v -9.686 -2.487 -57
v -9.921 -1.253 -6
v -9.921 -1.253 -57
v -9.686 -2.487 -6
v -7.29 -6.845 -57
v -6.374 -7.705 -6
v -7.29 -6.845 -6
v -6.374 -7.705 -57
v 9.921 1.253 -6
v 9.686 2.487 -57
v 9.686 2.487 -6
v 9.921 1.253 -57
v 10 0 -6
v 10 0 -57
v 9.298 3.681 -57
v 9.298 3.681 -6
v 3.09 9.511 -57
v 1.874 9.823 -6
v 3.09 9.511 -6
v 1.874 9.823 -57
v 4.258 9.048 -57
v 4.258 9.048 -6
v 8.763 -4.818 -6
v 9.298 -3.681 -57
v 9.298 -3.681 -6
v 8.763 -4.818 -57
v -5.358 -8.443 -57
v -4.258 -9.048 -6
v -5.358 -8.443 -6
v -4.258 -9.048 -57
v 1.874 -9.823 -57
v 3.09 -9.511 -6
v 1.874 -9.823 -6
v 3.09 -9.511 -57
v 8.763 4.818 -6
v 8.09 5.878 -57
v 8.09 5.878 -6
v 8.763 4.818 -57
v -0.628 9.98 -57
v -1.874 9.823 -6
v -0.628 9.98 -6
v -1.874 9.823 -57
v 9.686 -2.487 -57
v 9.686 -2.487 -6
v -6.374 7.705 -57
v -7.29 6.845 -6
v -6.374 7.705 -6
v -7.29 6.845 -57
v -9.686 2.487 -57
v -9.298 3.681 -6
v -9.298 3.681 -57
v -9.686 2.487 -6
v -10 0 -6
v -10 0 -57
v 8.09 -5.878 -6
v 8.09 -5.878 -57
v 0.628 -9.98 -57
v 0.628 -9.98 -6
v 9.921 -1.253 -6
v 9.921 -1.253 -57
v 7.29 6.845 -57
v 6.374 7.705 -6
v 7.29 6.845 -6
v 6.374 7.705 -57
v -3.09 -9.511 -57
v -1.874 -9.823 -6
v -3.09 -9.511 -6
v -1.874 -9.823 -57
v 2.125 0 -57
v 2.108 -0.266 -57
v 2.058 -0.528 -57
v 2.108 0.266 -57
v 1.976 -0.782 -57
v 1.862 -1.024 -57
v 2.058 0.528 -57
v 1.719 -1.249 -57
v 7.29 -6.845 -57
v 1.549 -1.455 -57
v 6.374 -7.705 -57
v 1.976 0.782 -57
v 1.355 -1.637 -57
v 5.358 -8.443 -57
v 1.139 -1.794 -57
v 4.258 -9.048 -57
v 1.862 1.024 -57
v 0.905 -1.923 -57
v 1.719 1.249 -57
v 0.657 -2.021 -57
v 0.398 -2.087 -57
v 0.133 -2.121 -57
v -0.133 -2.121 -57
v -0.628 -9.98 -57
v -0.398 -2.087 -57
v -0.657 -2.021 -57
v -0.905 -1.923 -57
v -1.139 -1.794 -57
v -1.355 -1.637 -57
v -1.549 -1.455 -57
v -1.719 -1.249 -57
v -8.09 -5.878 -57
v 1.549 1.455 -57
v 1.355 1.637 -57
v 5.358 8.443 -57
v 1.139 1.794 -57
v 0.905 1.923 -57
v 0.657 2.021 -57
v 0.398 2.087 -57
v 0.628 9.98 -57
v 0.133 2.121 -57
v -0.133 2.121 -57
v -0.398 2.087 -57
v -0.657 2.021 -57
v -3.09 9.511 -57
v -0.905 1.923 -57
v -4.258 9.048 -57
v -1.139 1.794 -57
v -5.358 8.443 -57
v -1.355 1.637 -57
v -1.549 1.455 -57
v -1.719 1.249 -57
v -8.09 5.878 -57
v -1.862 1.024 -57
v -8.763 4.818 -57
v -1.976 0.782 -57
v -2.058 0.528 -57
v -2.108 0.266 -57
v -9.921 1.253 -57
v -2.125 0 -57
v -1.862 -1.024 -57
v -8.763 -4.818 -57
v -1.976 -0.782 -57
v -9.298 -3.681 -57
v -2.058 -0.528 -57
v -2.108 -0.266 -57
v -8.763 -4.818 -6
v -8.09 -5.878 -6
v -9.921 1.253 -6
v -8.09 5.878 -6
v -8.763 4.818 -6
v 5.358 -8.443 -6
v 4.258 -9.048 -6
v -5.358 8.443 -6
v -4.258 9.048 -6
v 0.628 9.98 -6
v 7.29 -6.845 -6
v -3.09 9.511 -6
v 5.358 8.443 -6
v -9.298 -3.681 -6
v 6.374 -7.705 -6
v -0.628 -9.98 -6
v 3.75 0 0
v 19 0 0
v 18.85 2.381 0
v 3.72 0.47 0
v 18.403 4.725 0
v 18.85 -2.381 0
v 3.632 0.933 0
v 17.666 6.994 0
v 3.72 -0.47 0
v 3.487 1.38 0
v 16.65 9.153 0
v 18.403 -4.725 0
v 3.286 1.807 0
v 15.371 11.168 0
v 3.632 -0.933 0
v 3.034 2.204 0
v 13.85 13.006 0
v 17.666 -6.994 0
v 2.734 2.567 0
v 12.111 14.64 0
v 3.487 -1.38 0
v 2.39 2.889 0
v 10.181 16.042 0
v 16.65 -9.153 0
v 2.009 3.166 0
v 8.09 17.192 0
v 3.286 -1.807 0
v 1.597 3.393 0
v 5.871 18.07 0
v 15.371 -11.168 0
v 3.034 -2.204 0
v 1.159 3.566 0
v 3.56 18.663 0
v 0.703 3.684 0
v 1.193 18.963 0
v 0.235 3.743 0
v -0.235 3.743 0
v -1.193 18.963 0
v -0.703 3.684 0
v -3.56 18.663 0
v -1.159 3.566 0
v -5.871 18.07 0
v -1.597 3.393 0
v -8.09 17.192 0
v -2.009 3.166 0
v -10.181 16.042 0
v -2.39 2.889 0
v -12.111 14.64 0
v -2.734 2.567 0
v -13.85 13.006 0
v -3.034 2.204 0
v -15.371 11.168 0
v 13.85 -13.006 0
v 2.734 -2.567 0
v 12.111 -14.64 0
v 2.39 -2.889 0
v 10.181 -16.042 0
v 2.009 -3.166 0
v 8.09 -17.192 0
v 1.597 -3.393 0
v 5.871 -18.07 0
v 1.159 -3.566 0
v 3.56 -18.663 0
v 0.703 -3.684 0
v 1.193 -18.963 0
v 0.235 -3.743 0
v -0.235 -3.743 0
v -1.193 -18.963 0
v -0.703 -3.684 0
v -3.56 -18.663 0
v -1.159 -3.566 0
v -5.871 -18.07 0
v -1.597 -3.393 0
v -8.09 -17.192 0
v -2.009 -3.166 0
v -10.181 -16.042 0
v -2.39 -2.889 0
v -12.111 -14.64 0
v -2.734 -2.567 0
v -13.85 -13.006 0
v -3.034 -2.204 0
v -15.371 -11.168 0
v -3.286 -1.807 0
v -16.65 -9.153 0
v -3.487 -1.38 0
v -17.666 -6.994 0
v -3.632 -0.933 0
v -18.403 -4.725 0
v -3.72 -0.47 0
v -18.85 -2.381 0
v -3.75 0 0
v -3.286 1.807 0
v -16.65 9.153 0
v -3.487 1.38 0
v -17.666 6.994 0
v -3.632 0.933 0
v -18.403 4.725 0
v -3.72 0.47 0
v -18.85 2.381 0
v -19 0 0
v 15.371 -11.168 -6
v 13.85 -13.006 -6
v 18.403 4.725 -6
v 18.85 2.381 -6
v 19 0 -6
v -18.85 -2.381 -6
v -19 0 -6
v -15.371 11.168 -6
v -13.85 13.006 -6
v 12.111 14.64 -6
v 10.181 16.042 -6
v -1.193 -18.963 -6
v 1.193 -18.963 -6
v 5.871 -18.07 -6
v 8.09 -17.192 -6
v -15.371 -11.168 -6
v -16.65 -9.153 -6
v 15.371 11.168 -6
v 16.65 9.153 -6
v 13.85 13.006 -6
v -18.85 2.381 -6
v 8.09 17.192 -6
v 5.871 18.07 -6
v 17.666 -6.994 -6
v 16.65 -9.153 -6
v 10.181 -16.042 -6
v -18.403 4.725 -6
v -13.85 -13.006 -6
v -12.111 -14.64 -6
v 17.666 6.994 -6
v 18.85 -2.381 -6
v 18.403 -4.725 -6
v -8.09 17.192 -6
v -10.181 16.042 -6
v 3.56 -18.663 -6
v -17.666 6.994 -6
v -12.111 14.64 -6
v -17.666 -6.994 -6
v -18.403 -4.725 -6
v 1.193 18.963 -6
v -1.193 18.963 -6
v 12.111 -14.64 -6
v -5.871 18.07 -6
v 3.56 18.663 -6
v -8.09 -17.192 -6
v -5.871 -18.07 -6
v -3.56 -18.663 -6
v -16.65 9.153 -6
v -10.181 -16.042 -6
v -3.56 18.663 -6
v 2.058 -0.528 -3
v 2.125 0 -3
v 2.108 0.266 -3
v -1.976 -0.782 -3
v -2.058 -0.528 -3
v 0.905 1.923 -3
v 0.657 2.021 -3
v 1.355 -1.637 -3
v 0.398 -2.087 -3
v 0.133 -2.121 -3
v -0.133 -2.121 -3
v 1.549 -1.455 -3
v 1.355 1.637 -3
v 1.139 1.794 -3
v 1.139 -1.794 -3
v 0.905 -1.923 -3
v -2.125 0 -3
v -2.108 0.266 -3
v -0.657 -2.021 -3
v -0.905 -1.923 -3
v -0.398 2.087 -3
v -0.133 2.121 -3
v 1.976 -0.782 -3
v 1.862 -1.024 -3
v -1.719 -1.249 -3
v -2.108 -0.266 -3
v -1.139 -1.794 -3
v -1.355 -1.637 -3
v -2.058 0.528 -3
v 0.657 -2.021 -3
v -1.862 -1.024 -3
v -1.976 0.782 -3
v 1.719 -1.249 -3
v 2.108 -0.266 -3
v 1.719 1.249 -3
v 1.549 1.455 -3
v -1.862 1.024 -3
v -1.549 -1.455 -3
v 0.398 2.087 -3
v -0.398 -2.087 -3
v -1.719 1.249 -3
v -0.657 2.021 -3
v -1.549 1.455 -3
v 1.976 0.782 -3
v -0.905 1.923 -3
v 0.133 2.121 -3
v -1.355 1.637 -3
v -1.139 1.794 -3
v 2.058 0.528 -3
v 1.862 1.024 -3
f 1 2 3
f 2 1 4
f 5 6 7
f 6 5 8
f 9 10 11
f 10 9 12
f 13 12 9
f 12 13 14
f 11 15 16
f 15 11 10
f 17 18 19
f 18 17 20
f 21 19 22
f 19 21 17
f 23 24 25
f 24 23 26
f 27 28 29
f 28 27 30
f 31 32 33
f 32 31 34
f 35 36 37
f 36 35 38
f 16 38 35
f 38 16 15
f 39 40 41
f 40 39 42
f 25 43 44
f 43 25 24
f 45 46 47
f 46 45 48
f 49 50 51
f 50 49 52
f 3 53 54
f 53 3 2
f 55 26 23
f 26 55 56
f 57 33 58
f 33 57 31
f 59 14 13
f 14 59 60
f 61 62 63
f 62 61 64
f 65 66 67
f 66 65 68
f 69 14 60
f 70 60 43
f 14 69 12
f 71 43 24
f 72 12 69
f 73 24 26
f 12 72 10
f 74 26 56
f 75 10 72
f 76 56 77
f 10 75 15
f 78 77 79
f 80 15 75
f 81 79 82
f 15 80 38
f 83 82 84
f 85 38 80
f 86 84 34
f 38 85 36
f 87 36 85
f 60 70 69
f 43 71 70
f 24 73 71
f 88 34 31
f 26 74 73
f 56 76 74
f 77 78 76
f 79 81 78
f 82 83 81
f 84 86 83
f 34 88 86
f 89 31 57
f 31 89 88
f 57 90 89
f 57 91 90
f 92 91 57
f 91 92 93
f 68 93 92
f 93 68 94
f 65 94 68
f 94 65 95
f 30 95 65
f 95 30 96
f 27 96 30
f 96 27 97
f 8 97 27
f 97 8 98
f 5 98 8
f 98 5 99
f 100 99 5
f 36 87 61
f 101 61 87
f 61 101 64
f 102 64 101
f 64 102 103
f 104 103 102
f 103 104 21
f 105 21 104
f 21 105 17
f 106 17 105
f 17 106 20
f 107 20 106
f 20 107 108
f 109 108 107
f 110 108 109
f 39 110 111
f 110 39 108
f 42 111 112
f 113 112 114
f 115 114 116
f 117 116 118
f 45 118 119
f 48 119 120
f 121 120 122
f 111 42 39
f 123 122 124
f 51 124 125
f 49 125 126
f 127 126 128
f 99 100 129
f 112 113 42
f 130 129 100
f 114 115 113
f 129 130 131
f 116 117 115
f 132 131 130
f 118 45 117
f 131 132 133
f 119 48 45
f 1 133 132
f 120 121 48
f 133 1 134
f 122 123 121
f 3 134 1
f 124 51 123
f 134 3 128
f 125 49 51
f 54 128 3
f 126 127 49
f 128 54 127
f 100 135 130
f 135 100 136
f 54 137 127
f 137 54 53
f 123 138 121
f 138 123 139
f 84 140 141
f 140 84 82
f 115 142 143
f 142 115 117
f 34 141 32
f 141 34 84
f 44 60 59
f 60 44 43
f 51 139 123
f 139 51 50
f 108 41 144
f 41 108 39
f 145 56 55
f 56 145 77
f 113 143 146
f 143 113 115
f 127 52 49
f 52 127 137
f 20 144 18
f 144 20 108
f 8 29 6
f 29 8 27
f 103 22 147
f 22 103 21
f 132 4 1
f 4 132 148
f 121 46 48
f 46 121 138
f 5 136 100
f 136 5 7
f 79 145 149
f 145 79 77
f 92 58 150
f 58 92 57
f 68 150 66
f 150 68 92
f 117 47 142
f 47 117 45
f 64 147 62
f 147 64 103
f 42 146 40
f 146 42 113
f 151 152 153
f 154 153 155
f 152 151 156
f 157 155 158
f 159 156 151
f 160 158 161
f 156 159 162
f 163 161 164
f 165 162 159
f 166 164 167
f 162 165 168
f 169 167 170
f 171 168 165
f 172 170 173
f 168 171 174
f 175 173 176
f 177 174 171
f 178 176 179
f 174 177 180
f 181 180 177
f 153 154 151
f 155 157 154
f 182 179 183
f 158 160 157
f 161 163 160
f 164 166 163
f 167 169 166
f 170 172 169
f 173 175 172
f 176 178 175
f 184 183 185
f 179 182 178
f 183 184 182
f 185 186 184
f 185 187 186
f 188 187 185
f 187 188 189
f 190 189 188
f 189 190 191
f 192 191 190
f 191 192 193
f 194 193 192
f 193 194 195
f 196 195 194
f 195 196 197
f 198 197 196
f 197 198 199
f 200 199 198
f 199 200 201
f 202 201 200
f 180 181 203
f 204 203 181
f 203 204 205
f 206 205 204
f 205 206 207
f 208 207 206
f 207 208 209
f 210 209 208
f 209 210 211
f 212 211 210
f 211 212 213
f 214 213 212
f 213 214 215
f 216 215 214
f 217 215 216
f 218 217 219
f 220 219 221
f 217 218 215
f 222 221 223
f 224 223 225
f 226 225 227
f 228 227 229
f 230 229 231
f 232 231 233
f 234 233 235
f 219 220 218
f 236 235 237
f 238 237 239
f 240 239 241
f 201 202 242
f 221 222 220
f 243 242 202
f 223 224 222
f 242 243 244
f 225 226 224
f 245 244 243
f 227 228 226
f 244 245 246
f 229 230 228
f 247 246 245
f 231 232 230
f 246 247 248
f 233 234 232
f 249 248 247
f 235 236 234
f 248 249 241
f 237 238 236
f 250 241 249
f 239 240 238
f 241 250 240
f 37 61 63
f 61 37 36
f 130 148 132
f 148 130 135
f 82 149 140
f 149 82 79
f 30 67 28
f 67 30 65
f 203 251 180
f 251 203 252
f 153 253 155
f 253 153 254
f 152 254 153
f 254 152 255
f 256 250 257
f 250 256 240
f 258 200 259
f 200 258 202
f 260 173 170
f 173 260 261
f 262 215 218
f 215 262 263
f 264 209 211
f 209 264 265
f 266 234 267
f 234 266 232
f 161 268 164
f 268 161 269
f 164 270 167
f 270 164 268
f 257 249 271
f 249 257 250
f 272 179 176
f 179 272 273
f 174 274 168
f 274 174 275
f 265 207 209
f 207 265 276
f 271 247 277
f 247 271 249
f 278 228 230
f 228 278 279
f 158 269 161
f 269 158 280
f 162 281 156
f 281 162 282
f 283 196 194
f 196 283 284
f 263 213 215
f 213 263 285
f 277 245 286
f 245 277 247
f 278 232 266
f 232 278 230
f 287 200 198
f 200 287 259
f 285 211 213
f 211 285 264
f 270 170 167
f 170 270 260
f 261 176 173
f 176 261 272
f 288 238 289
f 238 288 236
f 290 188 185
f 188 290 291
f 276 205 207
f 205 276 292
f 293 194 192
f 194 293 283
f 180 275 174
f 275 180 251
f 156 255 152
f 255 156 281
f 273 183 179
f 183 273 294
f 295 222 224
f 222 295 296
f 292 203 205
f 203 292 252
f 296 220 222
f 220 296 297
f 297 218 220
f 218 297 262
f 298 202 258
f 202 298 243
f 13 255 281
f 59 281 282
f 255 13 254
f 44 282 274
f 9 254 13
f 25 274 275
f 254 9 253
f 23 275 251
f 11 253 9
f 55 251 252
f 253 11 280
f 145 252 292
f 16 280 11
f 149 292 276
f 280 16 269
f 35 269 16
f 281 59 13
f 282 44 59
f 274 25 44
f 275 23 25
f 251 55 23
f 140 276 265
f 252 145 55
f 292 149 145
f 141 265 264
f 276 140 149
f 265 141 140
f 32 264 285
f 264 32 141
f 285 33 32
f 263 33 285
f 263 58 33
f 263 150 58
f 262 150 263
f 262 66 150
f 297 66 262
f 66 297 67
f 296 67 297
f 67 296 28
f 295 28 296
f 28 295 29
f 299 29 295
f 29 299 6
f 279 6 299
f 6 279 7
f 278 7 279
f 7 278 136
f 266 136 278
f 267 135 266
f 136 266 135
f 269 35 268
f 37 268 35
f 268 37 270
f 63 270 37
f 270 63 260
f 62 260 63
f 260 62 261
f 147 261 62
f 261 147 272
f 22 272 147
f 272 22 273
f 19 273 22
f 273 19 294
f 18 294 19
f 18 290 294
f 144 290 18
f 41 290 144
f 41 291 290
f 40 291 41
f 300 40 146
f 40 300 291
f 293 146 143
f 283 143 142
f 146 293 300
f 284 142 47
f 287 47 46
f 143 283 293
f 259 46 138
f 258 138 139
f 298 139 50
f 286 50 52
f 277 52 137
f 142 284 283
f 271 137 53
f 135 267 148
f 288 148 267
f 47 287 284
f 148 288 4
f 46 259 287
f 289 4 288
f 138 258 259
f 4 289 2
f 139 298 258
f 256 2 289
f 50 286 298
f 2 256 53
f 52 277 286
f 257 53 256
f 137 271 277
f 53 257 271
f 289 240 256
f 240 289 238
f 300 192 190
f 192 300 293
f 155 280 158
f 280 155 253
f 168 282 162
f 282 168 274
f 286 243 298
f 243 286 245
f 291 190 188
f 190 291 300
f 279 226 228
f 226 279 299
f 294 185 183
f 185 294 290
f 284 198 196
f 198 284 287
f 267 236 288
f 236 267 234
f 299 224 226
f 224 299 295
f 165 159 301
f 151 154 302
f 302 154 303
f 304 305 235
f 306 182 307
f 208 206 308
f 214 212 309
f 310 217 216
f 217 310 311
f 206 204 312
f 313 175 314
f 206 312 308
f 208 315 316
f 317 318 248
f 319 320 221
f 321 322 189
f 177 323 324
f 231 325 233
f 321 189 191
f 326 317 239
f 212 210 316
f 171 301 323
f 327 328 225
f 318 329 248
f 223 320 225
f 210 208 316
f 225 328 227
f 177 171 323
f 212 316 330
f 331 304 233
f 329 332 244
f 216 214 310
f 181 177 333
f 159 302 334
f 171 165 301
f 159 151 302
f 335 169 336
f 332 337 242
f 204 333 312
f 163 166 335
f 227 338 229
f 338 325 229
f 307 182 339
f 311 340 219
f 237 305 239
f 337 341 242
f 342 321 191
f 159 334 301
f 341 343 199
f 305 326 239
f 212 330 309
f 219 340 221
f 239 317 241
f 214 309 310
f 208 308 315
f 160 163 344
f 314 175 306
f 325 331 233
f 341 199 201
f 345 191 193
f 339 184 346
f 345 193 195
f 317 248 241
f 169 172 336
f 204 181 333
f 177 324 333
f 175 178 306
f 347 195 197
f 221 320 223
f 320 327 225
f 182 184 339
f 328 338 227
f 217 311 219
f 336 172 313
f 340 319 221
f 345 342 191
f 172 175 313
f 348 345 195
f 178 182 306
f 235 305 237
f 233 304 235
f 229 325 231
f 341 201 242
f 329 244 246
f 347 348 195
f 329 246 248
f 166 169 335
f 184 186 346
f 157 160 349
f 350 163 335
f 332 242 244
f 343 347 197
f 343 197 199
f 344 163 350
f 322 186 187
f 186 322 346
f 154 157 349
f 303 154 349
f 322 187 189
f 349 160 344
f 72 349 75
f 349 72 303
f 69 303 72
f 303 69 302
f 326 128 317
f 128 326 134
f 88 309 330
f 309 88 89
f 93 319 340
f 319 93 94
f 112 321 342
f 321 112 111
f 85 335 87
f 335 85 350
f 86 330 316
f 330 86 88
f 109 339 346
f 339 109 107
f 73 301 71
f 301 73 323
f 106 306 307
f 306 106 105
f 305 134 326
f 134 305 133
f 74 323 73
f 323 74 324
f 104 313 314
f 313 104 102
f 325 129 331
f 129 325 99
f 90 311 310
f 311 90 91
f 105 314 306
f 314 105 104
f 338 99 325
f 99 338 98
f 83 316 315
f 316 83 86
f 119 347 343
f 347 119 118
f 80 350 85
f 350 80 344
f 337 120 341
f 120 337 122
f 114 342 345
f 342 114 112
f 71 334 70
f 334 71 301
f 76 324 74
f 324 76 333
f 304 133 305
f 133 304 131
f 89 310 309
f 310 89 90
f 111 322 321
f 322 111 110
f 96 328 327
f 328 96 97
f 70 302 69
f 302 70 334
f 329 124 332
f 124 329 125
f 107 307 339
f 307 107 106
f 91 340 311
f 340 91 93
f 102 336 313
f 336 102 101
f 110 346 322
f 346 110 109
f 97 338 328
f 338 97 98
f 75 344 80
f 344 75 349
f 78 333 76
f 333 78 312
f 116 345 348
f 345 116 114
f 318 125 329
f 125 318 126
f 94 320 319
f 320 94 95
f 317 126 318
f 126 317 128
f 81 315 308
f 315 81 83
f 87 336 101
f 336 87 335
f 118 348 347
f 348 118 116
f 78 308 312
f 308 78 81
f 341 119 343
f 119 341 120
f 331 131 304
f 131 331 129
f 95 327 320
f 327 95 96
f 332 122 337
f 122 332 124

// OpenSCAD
$fn = 50;


difference() {
	union() {
		translate(v = [0, 0, -57.0000000000]) {
			cylinder(h = 57, r = 10.0000000000);
		}
		translate(v = [0, 0, -6.0000000000]) {
			cylinder(h = 6, r = 19.0000000000);
		}
	}
	union() {
		translate(v = [0, 0, 0]) {
			rotate(a = [0, 0, 0]) {
				difference() {
					union() {
						#translate(v = [0, 0, -57.0000000000]) {
							cylinder(h = 57, r = 2.0000000000);
						}
						#translate(v = [0, 0, -3]) {
							cylinder(h = 3, r1 = 2.1250000000, r2 = 3.7500000000);
						}
						#translate(v = [0, 0, -57.0000000000]) {
							cylinder(h = 57, r = 2.1250000000);
						}
						#translate(v = [0, 0, -57.0000000000]) {
							cylinder(h = 57, r = 2.0000000000);
						}
					}
					union();
				}
			}
		}
	}
}
